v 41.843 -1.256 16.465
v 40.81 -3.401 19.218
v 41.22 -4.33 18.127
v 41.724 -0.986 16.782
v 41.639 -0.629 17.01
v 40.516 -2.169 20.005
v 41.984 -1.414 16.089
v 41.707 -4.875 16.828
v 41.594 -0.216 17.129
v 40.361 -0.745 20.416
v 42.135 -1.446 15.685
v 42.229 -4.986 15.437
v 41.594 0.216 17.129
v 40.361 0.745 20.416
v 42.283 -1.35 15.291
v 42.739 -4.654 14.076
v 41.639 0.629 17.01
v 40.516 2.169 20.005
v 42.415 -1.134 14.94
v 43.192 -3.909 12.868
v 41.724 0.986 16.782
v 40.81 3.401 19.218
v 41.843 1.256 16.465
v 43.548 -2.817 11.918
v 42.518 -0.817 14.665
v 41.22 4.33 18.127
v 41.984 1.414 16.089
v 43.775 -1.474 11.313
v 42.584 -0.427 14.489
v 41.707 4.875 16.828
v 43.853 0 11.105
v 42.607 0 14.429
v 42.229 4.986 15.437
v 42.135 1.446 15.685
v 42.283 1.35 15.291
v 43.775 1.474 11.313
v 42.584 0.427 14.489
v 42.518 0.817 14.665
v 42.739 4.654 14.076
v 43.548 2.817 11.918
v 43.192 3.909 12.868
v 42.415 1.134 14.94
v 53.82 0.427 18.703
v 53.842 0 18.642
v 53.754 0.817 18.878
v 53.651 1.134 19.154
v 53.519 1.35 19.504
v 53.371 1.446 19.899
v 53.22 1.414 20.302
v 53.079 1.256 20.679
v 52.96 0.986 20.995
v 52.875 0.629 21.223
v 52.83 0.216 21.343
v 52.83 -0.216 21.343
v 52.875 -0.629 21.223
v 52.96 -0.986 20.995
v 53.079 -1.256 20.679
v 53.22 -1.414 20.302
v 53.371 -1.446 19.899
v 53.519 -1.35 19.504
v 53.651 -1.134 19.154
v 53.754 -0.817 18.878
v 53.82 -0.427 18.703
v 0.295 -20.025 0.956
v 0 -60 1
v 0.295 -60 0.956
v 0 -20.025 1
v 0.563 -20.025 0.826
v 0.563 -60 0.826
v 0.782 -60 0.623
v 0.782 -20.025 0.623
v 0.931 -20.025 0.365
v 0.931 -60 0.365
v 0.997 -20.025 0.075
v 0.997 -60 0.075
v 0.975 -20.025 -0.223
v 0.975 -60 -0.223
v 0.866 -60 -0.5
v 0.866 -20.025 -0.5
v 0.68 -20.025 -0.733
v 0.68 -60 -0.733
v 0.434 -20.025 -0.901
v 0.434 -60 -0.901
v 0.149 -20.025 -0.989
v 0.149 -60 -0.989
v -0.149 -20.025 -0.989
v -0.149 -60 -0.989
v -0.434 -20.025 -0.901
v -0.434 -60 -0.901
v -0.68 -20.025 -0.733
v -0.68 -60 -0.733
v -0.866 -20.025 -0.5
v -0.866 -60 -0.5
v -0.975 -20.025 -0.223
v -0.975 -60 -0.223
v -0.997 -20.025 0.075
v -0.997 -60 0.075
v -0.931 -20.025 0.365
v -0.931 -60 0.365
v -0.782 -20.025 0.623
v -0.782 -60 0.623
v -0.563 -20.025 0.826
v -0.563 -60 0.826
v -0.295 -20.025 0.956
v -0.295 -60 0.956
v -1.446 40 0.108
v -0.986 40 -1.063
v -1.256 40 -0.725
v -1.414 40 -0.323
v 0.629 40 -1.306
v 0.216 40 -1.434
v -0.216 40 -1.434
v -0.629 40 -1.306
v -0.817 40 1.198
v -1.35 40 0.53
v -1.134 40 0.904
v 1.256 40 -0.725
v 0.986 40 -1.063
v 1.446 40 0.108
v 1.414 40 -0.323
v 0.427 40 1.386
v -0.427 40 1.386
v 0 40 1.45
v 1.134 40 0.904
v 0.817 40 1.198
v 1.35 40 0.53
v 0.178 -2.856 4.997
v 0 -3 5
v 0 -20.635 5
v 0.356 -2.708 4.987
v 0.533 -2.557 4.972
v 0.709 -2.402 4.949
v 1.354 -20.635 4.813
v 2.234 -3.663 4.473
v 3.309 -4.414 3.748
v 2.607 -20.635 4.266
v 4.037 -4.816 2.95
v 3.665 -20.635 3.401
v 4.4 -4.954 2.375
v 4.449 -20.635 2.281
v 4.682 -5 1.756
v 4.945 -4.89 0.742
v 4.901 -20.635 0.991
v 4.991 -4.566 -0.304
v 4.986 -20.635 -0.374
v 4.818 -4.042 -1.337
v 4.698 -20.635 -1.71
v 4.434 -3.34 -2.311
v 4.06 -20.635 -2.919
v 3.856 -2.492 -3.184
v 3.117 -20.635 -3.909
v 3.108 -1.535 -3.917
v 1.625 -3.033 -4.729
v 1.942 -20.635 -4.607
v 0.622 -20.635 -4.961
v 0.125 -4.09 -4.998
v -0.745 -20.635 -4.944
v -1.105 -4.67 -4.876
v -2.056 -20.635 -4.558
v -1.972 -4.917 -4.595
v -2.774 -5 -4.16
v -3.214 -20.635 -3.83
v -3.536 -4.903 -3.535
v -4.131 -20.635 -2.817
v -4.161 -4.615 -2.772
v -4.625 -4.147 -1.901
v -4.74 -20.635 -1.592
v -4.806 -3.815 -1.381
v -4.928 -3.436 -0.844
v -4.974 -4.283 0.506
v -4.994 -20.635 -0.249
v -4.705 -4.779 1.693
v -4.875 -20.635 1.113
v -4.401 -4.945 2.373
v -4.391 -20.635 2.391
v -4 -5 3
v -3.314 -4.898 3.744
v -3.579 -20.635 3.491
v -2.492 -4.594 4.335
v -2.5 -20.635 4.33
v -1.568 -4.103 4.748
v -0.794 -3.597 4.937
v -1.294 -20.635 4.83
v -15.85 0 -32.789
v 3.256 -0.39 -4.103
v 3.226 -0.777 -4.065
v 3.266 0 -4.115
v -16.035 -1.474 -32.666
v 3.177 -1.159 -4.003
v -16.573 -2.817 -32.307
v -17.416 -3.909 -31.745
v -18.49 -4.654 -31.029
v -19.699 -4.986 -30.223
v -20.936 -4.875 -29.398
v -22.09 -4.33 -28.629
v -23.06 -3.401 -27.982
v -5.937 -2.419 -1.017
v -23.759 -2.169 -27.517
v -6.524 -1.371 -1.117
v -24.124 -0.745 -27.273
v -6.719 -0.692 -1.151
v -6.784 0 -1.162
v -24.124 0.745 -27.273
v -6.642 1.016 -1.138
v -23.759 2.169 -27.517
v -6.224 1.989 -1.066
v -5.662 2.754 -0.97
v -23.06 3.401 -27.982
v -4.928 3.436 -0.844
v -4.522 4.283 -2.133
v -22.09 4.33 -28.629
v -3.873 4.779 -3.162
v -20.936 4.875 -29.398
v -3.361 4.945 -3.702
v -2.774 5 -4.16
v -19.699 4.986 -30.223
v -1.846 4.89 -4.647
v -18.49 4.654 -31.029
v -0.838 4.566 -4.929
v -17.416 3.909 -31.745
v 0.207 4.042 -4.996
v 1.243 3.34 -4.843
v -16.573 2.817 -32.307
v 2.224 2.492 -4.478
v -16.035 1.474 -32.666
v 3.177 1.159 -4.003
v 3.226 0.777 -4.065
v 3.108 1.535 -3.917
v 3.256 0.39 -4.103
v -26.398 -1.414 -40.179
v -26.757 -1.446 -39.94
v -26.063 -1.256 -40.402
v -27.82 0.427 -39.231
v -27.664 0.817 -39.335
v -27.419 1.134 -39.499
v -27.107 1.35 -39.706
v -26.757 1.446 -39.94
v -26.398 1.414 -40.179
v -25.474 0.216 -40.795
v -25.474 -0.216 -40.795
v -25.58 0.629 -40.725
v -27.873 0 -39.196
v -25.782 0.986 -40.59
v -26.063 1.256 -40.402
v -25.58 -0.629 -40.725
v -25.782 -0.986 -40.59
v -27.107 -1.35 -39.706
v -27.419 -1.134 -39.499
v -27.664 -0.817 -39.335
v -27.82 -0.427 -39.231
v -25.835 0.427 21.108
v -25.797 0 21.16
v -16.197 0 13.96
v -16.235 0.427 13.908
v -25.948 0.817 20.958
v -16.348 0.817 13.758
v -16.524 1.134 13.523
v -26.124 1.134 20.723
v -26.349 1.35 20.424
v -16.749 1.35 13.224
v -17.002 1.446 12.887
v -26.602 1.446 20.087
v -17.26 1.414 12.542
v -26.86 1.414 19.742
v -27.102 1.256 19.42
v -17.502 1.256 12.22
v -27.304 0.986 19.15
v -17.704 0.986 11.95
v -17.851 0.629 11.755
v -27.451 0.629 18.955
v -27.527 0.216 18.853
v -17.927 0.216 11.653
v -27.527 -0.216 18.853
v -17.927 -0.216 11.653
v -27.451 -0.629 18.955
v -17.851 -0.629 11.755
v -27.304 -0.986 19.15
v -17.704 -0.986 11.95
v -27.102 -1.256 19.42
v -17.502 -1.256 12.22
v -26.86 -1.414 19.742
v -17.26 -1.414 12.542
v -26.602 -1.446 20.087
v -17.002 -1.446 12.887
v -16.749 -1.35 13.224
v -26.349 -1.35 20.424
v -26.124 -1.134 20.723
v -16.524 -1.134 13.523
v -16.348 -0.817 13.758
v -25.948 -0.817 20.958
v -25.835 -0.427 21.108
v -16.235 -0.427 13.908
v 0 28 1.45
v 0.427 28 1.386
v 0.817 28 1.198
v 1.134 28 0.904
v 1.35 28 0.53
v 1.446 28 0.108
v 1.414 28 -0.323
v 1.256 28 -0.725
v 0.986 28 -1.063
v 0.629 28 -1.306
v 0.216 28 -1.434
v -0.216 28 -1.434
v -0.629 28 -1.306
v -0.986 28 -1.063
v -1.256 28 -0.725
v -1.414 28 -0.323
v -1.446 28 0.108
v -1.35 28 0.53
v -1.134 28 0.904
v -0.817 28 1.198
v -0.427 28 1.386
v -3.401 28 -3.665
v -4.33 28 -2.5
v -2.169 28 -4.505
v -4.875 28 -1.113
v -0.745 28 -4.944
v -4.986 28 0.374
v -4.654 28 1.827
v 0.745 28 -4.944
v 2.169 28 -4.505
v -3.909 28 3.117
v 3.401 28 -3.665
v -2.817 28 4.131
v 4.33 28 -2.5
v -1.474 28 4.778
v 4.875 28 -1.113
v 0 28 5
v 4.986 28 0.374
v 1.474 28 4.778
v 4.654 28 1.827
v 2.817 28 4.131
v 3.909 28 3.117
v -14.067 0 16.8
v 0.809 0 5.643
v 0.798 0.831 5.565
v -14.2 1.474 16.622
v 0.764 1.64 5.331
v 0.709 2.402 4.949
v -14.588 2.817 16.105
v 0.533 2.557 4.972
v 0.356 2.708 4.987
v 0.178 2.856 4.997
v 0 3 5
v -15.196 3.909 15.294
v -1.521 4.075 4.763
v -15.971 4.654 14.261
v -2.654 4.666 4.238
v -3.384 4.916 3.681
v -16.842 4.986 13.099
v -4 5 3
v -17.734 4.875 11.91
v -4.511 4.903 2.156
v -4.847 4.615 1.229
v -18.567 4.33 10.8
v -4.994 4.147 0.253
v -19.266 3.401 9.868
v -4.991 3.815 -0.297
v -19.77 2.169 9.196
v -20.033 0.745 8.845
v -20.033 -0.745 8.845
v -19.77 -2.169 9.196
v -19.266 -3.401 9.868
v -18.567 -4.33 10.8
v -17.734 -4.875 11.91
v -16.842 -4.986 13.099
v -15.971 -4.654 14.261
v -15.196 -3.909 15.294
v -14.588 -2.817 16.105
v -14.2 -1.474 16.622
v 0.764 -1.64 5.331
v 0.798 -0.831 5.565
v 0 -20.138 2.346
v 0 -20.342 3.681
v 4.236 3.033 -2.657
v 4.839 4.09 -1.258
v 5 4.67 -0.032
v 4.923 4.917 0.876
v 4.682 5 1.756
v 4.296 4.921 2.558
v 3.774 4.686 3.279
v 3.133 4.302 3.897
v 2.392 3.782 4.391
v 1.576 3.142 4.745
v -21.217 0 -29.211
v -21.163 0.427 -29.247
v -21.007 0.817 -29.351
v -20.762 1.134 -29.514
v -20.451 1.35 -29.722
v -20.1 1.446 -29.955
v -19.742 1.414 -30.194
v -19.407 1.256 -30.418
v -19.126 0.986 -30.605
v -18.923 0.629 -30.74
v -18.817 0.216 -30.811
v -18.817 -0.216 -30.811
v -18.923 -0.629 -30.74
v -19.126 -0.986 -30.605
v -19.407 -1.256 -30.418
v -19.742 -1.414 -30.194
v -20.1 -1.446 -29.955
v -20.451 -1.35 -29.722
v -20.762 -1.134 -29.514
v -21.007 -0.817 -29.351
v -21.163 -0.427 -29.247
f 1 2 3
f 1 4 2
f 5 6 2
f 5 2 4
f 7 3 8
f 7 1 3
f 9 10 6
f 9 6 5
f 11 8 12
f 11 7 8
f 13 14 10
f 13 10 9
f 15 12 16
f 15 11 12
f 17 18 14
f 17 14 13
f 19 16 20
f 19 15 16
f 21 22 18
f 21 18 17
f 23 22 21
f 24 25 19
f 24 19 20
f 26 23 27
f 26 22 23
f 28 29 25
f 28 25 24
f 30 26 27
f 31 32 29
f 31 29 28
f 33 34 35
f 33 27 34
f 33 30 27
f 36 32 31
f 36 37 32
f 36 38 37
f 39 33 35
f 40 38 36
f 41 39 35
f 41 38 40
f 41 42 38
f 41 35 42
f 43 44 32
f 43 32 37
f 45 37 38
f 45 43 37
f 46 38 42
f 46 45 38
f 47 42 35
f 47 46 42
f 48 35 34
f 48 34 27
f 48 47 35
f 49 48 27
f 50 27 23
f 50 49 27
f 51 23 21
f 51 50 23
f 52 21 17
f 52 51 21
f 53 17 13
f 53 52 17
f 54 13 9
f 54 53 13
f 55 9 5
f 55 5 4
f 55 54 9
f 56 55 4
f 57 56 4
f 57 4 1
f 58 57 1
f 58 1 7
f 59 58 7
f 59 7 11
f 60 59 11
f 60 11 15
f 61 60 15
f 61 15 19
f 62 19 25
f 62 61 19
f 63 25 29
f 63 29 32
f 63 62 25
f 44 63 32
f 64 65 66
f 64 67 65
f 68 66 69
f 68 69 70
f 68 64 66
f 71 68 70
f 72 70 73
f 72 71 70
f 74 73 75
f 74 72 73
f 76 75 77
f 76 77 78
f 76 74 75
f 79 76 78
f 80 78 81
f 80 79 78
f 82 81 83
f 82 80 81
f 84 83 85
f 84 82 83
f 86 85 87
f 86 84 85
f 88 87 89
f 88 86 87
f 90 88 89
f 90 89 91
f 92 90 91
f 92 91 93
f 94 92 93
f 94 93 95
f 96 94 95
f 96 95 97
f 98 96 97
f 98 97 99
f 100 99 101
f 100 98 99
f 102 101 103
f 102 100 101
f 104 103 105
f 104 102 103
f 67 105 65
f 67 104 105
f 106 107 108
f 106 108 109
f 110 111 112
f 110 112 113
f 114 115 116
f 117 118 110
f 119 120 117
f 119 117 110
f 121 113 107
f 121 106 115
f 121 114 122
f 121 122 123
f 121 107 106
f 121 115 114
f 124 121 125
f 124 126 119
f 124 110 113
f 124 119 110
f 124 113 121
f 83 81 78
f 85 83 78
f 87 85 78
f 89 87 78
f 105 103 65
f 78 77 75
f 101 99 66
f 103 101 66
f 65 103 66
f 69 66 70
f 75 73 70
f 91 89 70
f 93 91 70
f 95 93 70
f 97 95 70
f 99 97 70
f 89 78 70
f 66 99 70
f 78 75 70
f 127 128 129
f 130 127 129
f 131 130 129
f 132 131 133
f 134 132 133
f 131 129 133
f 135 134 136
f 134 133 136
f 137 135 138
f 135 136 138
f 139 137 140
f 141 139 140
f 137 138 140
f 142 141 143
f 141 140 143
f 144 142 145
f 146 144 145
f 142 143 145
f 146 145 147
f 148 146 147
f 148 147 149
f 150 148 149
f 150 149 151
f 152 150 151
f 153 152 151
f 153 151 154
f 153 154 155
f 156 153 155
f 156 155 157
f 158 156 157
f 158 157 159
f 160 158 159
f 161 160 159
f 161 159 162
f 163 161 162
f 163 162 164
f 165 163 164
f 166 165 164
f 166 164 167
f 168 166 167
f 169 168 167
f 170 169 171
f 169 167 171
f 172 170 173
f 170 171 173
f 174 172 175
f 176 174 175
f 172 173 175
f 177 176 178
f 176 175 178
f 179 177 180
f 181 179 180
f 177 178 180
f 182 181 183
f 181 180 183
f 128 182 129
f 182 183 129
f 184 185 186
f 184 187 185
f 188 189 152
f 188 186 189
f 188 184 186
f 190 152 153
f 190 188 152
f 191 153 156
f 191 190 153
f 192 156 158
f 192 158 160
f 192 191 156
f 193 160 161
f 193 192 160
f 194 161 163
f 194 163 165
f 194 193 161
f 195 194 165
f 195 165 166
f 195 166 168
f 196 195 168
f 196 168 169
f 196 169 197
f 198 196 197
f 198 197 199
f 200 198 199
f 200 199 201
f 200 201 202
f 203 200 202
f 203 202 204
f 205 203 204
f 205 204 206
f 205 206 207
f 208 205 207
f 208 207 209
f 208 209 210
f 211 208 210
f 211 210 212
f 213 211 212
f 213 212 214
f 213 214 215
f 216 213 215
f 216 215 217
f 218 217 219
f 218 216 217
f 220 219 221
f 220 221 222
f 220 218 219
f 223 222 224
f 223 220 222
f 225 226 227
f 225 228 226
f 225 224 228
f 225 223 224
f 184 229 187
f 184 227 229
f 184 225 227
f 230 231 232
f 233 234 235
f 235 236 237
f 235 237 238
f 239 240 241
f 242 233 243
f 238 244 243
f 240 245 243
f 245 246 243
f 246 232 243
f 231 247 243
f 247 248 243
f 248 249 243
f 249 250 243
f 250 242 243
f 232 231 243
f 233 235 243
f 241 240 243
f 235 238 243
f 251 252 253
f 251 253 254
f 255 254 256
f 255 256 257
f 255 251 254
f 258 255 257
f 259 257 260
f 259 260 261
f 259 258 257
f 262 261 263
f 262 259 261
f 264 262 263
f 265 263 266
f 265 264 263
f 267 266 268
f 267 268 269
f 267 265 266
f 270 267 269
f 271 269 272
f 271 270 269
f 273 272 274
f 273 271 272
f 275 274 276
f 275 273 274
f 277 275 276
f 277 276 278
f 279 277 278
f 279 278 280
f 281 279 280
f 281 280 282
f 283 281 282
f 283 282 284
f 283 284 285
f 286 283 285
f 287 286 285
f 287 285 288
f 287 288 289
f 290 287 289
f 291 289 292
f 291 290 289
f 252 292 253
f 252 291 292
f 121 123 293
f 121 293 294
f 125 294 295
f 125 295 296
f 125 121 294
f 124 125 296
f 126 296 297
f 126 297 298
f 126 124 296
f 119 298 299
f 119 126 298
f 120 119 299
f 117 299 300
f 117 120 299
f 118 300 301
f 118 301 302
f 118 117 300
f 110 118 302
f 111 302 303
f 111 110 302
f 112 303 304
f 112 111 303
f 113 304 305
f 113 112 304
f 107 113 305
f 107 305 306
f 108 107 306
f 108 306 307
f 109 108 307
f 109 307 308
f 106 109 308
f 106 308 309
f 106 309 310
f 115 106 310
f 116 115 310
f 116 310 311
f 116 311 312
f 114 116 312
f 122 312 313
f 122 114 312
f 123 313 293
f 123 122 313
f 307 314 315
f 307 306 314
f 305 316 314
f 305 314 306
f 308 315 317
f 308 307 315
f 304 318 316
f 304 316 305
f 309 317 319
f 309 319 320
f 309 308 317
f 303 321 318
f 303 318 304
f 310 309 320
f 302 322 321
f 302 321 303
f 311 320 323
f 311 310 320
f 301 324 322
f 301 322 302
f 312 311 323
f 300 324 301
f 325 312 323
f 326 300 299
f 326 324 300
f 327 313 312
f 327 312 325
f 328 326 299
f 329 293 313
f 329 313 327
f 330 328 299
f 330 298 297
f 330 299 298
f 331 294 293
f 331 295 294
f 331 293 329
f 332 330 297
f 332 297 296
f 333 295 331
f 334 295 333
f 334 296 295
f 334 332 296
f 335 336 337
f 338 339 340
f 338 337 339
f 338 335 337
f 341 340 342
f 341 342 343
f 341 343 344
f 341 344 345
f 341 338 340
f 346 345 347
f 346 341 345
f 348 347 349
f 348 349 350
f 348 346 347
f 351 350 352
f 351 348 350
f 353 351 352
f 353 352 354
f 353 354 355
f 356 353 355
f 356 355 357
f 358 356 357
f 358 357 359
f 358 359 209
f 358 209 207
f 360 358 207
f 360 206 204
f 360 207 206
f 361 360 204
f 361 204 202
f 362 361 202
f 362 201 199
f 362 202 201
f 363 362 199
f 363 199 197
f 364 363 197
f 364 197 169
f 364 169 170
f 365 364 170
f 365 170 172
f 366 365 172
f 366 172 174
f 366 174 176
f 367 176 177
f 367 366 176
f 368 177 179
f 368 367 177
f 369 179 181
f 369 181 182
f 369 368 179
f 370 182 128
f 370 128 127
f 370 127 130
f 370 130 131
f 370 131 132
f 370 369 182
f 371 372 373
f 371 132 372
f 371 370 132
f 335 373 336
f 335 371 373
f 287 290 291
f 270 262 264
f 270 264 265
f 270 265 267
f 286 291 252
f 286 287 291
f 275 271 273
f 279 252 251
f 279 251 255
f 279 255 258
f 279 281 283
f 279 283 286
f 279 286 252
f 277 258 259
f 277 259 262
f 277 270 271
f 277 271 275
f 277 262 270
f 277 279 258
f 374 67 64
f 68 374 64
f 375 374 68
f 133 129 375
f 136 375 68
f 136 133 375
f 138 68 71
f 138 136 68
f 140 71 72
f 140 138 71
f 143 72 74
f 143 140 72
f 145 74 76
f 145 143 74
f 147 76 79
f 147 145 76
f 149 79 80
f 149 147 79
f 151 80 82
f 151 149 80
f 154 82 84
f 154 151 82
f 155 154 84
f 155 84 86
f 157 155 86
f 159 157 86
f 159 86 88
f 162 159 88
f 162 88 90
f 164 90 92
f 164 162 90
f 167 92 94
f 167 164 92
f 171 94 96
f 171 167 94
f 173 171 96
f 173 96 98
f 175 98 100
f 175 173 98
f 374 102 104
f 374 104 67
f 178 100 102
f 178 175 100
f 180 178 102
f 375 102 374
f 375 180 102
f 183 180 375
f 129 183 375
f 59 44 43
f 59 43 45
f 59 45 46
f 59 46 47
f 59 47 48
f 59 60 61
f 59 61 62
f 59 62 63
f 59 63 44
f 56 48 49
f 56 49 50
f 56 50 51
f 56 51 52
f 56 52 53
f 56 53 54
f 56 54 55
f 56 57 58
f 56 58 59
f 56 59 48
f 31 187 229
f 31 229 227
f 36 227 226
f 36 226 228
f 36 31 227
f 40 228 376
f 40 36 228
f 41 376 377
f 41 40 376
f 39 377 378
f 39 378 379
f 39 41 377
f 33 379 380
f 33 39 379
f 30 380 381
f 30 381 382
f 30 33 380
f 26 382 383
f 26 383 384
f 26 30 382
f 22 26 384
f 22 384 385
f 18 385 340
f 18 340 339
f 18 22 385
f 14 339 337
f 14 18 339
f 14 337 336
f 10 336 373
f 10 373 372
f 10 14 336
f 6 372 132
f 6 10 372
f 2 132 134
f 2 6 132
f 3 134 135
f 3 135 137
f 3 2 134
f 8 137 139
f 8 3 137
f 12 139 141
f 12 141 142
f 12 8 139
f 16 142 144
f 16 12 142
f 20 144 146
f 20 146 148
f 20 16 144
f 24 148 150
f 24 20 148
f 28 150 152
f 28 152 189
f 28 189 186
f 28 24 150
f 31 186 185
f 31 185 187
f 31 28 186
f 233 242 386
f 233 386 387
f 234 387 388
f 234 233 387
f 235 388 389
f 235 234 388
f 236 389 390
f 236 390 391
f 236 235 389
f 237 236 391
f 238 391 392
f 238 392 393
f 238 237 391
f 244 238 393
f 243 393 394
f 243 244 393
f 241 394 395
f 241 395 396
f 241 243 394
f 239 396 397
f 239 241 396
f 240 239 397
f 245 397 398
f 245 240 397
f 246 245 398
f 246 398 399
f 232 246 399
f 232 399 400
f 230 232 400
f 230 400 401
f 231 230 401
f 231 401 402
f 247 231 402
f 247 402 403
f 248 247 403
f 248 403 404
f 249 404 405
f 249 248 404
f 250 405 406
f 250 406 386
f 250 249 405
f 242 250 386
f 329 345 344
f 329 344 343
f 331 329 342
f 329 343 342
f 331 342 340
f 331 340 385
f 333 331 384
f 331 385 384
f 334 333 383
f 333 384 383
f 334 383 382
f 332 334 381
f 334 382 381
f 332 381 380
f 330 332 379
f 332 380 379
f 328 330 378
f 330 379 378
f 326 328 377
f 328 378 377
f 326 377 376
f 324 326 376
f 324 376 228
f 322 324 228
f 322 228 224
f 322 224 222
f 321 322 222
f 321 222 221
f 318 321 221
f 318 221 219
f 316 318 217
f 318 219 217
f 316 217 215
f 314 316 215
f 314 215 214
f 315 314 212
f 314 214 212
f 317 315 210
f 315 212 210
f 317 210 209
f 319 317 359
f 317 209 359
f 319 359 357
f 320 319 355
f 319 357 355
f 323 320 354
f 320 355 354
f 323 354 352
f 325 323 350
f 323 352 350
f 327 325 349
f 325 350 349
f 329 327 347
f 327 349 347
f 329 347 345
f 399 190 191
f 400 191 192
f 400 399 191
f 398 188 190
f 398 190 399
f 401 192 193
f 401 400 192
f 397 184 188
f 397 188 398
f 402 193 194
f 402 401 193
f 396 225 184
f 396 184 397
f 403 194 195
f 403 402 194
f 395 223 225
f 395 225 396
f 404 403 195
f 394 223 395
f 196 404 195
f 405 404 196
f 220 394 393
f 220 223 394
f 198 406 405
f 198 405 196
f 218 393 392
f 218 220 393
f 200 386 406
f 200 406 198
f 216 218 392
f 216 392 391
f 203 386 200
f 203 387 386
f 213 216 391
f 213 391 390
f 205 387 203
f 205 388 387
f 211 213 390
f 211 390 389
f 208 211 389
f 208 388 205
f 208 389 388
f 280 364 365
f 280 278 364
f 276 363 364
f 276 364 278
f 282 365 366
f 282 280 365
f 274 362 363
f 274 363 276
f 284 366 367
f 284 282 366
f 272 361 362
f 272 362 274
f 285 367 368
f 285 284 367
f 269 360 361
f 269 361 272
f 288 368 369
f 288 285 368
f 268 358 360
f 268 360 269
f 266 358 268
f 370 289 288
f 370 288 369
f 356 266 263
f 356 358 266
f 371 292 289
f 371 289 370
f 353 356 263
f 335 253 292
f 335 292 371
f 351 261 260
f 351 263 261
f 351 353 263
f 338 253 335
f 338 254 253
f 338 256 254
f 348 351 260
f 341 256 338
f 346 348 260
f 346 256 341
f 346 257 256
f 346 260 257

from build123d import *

# Parameters (mm, degrees)
SKETCH_3_R           = 5
SKETCH_4_R           = 5
SKETCH_2_R           = 5
SKETCH_7_R           = 5
SKETCH_7_R_2         = 1.45
CUT_EXTRUDE_1_DEPTH  = 12
SKETCH_8_R           = 5
SKETCH_8_R_2         = 1.45
CUT_EXTRUDE_2_DEPTH  = 12
SKETCH_9_R           = 5
SKETCH_9_R_2         = 1.45
CUT_EXTRUDE_3_DEPTH  = 12
EXTRUDE_1_DEPTH      = 40
EXTRUDE_1_DEPTH_BACK = 60
SKETCH_10_R          = 5
SKETCH_12_R          = 5
SKETCH_12_R_2        = 1.45
CUT_EXTRUDE_5_DEPTH  = 12


with BuildPart() as part:
    # 扫描1: sweep along a path in 草图1
    with BuildLine(Plane(origin=(0, 0, 0), x_dir=(1, 0, 0), z_dir=(0, 1, 0))) as sweep_1_path:
        Line((0, 0), (53.333333333, -20))
    # 草图3 → 扫描1 (sweep)
    with BuildSketch(Plane(origin=(0, 0, 0), x_dir=(0.35112344158838826, 0, -0.9363291775690458), z_dir=(0.9363291775690458, 0, 0.35112344158838826))):
        Circle(SKETCH_3_R)
    sweep(path=sweep_1_path.line)

    # 扫描7: sweep along a path in 草图5
    with BuildLine(Plane(origin=(0, 0, 0), x_dir=(1, 0, 0), z_dir=(0, 1, 0))) as sweep_7_path:
        Line((0, 0), (-26.666666667, 40))
    # 草图4 → 扫描7 (sweep)
    with BuildSketch(Plane(origin=(0, 0, 0), x_dir=(0.8320502943378456, 0, -0.5547001962252264), z_dir=(0.5547001962252264, 0, 0.8320502943378456))):
        Circle(SKETCH_4_R)
    sweep(path=sweep_7_path.line)

    # 扫描8: sweep along a path in 草图6
    with BuildLine(Plane(origin=(0, 0, 0), x_dir=(1, 0, 0), z_dir=(0, 1, 0))) as sweep_8_path:
        Line((0, 0), (-26.666666667, -20))
    # 草图2 → 扫描8 (sweep)
    with BuildSketch(Plane(origin=(0, 0, 0), x_dir=(0.600000000000003, 0, 0.7999999999999979), z_dir=(-0.7999999999999979, 0, 0.600000000000003))):
        Circle(SKETCH_2_R)
    sweep(path=sweep_8_path.line)

    # 草图7 → 切除-拉伸1 (cut)
    with BuildSketch(Plane(origin=(-26.666666667, 0, -40), x_dir=(-0.8320502943378455, 0, 0.5547001962252265), z_dir=(-0.5547001962252265, 0, -0.8320502943378456))):
        Circle(SKETCH_7_R)
        Circle(SKETCH_7_R_2, mode=Mode.SUBTRACT)
    extrude(amount=-CUT_EXTRUDE_1_DEPTH, mode=Mode.SUBTRACT)

    # 草图8 → 切除-拉伸2 (cut)
    with BuildSketch(Plane(origin=(-26.666666667, 0, 20), x_dir=(0.6000000000000031, 0, 0.7999999999999977), z_dir=(-0.7999999999999977, 0, 0.6000000000000031))):
        Circle(SKETCH_8_R)
        Circle(SKETCH_8_R_2, mode=Mode.SUBTRACT)
    extrude(amount=-CUT_EXTRUDE_2_DEPTH, mode=Mode.SUBTRACT)

    # 草图9 → 切除-拉伸3 (cut)
    with BuildSketch(Plane(origin=(53.333333333, 0, 20), x_dir=(0.35112344158838826, 0, -0.9363291775690458), z_dir=(0.9363291775690458, 0, 0.35112344158838826))):
        Circle(SKETCH_9_R)
        Circle(SKETCH_9_R_2, mode=Mode.SUBTRACT)
    extrude(amount=-CUT_EXTRUDE_3_DEPTH, mode=Mode.SUBTRACT)

    # 草图10 → 凸台-拉伸1 (add, two sides: drawn at the far end of the back side and taken through both)
    with BuildSketch(Plane(origin=(0, 0, 0), x_dir=(1, 0, 0), z_dir=(0, 1, 0)).offset(-EXTRUDE_1_DEPTH_BACK)):
        with Locations(Location((0, 0, 0), (0, 0, 270))):
            Circle(SKETCH_10_R)
    extrude(amount=EXTRUDE_1_DEPTH + EXTRUDE_1_DEPTH_BACK)

    # 草图12 → 切除-拉伸5 (cut)
    with BuildSketch(Plane(origin=(0, 40, 0), x_dir=(1, 0, 0), z_dir=(0, 1, 0))):
        with Locations(Location((0, 0, 0), (0, 0, 270))):
            Circle(SKETCH_12_R)
        with Locations(Location((0, 0, 0), (0, 0, 270))):
            Circle(SKETCH_12_R_2, mode=Mode.SUBTRACT)
    extrude(amount=-CUT_EXTRUDE_5_DEPTH, mode=Mode.SUBTRACT)

    # 草图13 → 切除-旋转1 (revolve, cut)
    with BuildSketch(Plane(origin=(0, 0, 0), x_dir=(0, 0, -1), z_dir=(1, 0, 0))):
        with BuildLine():
            Line((-1, -59.017604387), (-1, -20.025015645))
            ThreePointArc((-1, -20.025015645), (-19.897410745, -37.976872316), (-5, -59.364916731))
            Line((-5, -59.364916731), (-5, -59.017604387))
            Line((-5, -59.017604387), (-1, -59.017604387))
        make_face()
        with BuildLine():
            Line((-1, -59.974984355), (-1, -59.017604387))
            Line((-1, -59.017604387), (-5, -59.017604387))
            Line((-5, -59.017604387), (-5, -59.364916731))
            ThreePointArc((-5, -59.364916731), (-3.015467729, -59.771367034), (-1, -59.974984355))
        make_face()
        with BuildLine():
            ThreePointArc((-1, -59.974984355), (-3.015467729, -59.771367034), (-5, -59.364916731))
            Line((-5, -59.364916731), (-5, -60))
            Line((-5, -60), (-1, -60))
            Line((-1, -60), (-1, -59.974984355))
        make_face()
    revolve(axis=Axis((0, -1000, 0), (0, 1, 0)), mode=Mode.SUBTRACT)


solid = part.part
